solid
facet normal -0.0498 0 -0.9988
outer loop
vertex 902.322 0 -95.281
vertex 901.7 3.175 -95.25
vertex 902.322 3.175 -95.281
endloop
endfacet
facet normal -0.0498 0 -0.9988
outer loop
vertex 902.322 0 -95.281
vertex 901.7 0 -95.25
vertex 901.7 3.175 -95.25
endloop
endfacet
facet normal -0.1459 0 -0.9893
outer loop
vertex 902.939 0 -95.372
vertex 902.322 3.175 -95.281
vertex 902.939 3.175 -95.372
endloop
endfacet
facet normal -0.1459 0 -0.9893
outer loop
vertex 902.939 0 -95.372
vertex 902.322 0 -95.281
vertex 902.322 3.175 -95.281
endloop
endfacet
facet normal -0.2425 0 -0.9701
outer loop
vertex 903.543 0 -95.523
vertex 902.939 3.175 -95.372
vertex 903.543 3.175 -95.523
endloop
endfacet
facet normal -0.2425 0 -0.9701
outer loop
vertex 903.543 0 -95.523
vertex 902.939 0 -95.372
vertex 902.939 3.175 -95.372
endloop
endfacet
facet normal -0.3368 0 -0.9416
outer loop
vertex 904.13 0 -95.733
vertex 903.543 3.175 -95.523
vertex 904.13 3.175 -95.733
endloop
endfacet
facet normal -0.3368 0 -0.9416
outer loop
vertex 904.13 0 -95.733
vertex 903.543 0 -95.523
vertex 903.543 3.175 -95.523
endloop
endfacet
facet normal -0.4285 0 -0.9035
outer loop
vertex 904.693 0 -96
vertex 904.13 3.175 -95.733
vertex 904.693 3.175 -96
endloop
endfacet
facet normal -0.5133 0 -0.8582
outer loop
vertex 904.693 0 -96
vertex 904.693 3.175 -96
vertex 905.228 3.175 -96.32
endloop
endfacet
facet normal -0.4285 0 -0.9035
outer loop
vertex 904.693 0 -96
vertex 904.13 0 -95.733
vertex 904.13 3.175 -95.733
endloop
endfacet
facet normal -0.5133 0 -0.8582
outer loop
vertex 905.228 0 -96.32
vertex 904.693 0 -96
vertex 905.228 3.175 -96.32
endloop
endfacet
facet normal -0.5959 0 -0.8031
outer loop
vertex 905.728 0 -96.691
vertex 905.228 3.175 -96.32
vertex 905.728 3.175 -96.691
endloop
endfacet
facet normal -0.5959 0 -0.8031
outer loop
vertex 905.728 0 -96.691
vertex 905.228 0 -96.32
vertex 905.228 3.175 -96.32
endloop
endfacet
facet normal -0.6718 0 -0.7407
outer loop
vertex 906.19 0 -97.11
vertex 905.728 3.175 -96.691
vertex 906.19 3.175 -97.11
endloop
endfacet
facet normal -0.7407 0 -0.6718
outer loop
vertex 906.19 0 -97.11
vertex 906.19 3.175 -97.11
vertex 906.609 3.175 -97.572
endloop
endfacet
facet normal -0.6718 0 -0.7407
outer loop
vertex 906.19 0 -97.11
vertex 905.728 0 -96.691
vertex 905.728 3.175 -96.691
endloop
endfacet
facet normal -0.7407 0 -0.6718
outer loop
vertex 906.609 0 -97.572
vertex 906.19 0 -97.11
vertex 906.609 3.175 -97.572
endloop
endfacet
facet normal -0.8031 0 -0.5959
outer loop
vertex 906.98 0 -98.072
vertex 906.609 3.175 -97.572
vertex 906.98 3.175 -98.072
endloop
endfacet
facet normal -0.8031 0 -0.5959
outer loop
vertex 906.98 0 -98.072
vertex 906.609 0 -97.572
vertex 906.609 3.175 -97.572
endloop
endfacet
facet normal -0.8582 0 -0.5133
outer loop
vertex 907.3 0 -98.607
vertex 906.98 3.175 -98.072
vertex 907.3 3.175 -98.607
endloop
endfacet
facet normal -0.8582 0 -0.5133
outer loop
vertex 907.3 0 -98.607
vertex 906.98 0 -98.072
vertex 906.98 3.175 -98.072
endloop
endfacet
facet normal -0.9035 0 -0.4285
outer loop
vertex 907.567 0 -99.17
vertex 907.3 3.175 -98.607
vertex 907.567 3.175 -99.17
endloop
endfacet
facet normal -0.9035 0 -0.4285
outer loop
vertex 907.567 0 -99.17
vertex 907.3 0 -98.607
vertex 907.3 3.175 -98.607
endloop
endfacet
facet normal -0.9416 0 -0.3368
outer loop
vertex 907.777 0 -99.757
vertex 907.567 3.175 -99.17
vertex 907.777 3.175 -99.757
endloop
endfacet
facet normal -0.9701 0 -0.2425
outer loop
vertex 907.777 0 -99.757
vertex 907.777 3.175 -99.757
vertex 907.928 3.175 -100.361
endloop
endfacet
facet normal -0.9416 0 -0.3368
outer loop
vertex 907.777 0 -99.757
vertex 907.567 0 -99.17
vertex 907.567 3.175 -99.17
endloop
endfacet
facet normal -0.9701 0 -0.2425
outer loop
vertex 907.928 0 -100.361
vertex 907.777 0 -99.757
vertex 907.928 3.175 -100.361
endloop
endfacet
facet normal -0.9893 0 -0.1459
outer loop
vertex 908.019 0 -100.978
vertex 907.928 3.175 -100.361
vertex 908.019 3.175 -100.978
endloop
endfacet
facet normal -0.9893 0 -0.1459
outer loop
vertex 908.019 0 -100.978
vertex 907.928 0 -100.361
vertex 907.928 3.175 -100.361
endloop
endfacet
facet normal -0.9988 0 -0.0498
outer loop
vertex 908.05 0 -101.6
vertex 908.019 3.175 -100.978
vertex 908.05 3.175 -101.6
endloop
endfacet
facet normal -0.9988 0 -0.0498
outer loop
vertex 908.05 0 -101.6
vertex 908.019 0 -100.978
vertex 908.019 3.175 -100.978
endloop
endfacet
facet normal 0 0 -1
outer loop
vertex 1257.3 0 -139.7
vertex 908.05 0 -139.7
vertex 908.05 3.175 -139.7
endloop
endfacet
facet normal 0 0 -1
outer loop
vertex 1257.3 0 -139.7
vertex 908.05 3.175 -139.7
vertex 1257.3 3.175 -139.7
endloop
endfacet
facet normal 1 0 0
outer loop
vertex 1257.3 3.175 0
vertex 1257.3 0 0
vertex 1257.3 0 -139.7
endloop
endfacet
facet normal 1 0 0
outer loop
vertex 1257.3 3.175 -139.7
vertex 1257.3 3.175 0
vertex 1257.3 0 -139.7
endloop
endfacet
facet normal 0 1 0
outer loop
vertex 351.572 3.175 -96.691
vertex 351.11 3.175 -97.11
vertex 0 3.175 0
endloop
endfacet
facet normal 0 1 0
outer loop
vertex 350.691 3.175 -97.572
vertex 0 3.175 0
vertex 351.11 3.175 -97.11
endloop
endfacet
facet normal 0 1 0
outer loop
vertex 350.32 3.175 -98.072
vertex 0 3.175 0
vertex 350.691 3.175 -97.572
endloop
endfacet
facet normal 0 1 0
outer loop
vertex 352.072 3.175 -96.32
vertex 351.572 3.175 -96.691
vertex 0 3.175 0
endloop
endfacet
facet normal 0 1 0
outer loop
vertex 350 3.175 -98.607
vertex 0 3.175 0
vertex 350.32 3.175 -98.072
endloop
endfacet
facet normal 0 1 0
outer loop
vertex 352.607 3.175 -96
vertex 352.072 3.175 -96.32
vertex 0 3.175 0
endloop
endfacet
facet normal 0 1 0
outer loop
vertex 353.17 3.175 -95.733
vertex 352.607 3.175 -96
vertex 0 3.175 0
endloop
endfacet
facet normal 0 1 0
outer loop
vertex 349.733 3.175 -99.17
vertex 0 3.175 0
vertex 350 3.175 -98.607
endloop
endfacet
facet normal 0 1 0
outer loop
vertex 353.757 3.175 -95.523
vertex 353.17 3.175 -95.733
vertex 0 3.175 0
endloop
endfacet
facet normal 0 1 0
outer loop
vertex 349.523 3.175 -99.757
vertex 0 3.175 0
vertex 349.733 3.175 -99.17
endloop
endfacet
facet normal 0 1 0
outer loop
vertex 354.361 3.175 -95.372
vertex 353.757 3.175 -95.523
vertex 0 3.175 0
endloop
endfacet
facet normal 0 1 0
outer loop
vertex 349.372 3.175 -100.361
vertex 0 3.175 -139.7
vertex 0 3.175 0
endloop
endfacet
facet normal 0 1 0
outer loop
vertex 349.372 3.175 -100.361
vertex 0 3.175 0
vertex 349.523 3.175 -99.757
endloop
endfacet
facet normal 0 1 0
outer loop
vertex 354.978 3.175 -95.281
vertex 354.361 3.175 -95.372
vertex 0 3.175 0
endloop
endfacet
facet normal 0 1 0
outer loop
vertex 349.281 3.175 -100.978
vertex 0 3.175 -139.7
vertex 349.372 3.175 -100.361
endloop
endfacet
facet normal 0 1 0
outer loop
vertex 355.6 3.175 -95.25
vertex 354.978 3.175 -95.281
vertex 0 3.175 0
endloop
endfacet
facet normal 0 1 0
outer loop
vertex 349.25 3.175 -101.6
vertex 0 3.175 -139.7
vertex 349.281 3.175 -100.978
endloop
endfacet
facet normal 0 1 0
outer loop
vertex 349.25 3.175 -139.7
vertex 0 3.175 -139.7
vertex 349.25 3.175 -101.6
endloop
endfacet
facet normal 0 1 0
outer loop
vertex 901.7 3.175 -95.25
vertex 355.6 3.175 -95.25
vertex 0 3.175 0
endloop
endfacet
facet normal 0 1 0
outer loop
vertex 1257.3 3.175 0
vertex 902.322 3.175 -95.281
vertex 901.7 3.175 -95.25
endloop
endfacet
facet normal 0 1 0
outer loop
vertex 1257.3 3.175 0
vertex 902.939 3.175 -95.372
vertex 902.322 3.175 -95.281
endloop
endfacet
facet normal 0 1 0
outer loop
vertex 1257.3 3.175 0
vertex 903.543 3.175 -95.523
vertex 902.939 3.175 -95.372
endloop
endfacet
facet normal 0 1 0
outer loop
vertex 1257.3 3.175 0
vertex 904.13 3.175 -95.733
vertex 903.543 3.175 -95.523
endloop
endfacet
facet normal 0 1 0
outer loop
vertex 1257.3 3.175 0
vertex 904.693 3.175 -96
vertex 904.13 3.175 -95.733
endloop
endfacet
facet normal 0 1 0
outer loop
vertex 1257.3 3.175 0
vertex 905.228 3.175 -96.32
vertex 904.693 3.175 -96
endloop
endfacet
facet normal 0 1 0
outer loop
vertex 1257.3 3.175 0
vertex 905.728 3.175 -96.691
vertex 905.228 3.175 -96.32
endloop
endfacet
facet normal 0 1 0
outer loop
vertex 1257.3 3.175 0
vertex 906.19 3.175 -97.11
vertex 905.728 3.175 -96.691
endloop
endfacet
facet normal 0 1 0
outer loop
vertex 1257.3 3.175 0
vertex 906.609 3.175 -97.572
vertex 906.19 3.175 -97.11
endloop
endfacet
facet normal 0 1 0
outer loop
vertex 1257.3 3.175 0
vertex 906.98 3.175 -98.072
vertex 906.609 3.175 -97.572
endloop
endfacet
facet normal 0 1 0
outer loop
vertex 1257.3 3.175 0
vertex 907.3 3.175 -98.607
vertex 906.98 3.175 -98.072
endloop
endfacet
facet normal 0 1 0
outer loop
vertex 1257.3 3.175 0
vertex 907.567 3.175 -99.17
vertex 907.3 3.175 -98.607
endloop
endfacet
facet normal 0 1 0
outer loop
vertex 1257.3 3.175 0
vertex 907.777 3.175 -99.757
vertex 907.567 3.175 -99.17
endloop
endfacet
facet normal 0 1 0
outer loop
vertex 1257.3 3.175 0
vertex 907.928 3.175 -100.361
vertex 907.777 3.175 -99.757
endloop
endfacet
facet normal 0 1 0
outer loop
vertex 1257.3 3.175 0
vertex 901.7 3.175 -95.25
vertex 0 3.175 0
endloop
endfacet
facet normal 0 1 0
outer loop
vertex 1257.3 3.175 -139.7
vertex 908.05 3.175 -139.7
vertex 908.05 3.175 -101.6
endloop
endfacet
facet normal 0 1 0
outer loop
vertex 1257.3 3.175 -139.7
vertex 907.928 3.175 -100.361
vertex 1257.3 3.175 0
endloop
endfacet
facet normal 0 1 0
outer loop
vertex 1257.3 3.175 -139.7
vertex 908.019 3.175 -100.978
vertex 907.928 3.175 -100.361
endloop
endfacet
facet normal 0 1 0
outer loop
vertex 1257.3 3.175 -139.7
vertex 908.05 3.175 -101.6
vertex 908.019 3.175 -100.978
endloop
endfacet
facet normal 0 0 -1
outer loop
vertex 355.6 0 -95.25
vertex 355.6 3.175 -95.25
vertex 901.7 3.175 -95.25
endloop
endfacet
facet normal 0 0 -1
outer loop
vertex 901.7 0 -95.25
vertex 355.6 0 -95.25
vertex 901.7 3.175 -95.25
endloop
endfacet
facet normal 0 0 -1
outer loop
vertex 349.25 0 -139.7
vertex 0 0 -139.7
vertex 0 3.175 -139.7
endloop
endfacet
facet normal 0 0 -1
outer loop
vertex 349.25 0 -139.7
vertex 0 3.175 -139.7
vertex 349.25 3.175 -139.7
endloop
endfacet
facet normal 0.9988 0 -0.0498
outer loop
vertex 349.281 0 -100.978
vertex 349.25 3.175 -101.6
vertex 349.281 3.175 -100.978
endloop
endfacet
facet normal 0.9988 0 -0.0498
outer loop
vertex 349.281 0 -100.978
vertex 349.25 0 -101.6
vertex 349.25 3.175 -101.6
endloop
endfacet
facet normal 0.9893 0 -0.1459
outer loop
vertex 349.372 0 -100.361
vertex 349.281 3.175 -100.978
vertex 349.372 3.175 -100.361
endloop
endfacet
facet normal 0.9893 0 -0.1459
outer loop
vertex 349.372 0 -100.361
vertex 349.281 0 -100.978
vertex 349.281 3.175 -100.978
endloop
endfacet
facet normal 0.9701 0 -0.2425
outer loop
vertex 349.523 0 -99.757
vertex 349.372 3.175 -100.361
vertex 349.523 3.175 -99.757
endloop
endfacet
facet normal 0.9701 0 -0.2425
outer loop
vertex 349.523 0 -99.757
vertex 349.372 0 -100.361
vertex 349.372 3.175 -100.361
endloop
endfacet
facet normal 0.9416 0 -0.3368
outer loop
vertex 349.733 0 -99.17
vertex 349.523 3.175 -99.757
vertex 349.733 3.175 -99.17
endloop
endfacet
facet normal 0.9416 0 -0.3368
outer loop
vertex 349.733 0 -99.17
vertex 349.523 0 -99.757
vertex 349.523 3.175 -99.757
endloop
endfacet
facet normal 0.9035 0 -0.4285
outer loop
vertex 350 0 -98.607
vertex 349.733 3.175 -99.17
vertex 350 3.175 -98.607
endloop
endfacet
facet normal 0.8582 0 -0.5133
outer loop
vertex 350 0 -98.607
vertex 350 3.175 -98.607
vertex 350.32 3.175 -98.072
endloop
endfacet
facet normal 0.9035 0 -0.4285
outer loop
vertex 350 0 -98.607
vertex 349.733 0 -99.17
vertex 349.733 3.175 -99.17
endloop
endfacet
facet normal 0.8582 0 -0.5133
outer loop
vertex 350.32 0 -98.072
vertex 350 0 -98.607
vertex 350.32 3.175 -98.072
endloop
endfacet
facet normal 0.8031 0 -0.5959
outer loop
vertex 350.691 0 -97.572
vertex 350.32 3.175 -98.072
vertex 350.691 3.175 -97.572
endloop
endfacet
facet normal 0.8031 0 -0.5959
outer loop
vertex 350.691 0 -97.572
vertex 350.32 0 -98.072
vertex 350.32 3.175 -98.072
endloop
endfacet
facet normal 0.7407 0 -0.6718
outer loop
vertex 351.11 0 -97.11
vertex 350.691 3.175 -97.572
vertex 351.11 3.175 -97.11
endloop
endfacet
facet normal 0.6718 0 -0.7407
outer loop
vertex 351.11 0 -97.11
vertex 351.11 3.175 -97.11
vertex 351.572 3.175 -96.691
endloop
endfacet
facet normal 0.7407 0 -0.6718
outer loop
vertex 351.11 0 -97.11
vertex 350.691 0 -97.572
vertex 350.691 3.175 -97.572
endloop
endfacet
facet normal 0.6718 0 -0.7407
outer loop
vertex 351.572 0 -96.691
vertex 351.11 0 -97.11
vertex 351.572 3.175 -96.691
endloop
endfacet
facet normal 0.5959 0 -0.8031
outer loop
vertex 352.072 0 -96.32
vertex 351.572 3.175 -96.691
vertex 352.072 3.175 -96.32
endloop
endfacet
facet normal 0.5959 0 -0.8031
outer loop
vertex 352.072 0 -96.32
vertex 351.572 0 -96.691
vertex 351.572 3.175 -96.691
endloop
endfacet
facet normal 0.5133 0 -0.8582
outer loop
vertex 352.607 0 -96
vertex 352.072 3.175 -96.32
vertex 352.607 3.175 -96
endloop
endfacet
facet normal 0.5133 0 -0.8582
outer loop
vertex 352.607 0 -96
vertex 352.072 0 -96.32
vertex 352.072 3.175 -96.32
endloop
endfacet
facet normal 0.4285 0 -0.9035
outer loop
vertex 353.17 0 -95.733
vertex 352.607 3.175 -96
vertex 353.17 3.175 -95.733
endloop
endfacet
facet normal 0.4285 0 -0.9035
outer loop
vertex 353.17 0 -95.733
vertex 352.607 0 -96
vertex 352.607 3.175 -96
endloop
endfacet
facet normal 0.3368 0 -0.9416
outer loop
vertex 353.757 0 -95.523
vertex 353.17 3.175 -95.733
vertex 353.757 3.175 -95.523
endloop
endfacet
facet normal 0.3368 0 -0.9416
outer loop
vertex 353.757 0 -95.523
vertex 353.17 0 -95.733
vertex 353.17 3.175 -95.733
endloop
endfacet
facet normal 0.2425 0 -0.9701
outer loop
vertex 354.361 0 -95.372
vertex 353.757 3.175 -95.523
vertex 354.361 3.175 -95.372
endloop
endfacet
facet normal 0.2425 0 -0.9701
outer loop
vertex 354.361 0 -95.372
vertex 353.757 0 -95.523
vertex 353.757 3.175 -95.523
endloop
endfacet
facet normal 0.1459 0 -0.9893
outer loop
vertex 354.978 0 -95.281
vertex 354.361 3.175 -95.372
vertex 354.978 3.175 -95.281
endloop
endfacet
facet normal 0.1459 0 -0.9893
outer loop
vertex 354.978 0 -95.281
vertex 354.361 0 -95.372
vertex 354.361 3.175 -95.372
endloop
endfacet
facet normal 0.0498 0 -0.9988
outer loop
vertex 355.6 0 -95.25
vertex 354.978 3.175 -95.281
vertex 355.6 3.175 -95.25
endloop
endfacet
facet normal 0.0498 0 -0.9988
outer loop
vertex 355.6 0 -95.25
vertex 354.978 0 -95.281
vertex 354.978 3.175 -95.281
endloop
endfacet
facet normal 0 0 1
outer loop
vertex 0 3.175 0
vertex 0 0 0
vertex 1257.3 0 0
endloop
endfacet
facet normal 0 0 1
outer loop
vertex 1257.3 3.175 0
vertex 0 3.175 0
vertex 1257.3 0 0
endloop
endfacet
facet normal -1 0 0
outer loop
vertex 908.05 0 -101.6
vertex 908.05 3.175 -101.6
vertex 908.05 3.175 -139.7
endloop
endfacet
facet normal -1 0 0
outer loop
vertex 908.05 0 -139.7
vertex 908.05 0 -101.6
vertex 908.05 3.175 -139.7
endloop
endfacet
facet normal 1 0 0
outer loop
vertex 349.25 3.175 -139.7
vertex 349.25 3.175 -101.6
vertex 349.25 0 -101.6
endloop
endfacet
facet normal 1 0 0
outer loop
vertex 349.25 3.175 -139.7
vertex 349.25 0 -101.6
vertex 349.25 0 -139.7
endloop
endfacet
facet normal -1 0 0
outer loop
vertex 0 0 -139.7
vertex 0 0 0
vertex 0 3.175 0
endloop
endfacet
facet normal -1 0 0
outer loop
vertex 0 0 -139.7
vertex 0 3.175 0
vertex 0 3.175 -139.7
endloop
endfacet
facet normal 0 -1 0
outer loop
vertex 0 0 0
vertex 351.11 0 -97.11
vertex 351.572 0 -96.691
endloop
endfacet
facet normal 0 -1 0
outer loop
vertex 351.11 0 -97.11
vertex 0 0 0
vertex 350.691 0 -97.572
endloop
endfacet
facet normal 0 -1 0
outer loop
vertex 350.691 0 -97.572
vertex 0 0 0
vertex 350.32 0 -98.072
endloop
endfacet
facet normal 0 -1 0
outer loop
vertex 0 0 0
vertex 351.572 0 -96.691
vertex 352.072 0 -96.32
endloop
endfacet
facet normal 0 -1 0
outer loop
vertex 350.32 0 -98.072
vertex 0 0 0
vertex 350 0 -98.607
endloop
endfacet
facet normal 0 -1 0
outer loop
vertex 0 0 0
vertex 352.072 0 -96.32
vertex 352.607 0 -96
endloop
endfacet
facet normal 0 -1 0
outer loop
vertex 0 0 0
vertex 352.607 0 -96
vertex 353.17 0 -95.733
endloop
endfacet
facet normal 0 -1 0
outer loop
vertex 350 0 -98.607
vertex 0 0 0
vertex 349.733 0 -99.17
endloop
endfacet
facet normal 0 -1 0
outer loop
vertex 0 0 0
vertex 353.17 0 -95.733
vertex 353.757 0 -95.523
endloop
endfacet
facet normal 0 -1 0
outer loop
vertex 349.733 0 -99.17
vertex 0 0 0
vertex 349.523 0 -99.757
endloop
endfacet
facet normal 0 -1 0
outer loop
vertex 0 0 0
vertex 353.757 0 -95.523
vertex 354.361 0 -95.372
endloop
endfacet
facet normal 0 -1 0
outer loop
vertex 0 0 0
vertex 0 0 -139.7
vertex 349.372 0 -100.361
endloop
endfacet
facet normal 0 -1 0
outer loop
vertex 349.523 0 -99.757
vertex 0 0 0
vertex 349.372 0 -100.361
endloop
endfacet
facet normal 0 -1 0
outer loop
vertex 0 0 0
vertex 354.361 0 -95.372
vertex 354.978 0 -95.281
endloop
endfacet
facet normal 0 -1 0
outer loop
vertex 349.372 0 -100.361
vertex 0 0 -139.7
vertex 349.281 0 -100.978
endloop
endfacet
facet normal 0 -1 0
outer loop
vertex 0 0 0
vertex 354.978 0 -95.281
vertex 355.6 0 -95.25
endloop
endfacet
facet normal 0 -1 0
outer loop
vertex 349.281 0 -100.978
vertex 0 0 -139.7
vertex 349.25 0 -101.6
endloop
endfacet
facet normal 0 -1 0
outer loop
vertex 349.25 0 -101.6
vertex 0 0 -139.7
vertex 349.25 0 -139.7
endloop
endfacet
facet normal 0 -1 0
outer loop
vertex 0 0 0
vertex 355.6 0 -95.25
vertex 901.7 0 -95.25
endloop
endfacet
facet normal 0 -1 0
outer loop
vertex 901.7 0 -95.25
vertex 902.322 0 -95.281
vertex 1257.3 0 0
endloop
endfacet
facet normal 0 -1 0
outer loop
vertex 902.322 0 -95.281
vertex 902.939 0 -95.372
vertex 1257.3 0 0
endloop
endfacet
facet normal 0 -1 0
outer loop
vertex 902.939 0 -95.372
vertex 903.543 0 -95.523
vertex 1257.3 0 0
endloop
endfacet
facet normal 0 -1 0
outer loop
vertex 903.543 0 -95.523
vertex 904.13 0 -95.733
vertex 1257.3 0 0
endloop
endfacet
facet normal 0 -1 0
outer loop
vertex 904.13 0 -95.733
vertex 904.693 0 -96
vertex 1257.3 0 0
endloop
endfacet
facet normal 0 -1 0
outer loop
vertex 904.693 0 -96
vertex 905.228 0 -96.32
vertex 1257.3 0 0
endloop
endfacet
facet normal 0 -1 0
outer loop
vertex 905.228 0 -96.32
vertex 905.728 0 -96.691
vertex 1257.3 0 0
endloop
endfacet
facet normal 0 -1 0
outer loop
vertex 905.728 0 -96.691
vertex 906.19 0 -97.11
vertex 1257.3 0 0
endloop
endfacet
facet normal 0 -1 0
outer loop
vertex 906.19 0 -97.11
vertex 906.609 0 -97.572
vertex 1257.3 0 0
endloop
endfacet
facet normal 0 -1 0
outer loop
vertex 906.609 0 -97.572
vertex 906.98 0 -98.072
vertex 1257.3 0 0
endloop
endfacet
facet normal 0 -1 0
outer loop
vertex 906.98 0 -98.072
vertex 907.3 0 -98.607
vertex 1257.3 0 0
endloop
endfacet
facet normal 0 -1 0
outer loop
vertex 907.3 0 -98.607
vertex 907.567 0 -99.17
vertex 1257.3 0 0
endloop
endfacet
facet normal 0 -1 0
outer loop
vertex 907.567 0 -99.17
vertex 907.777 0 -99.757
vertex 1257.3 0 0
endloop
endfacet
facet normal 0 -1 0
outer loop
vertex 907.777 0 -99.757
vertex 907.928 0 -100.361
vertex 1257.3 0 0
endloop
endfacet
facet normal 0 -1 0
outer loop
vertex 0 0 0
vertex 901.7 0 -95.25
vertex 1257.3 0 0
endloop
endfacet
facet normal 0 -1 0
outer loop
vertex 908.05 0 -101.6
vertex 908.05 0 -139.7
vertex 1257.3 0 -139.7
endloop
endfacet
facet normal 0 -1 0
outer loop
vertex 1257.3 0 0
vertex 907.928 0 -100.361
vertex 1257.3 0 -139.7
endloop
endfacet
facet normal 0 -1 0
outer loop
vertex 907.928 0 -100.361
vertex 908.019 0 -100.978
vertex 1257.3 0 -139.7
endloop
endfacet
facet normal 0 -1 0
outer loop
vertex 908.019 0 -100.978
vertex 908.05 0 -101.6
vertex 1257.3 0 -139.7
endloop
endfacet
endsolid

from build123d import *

# Parameters (mm, degrees)
SKETCH1_W           = 1257.3
SKETCH1_H           = 139.7
BOSS_EXTRUDE1_DEPTH = 3.175
SKETCH2_W           = 558.8
SKETCH2_H           = 44.45
CUT_EXTRUDE1_DEPTH  = 4.175
FILLET1_R           = 6.35


with BuildPart() as part:
    # Sketch1 → Boss-Extrude1 (new body)
    with BuildSketch(Plane(origin=(0, 0, 0), x_dir=(1, 0, 0), z_dir=(0, 1, 0))):
        with Locations((628.65, 69.85)):
            Rectangle(SKETCH1_W, SKETCH1_H)
    extrude(amount=BOSS_EXTRUDE1_DEPTH)

    # Sketch2 → Cut-Extrude1 (cut, through all)
    with BuildSketch(Plane(origin=(0, 3.175, 0), x_dir=(1, 0, 0), z_dir=(0, 1, 0))):
        with Locations((628.65, 117.475)):
            Rectangle(SKETCH2_W, SKETCH2_H)
    extrude(amount=-CUT_EXTRUDE1_DEPTH, mode=Mode.SUBTRACT)

    # Fillet1
    fillet1_edges = [part.edges().sort_by_distance(p)[0] for p in [
        (349.25, 1.5875, -95.25),
        (908.05, 1.5875, -95.25),
    ]]
    fillet(fillet1_edges, radius=FILLET1_R)


solid = part.part
